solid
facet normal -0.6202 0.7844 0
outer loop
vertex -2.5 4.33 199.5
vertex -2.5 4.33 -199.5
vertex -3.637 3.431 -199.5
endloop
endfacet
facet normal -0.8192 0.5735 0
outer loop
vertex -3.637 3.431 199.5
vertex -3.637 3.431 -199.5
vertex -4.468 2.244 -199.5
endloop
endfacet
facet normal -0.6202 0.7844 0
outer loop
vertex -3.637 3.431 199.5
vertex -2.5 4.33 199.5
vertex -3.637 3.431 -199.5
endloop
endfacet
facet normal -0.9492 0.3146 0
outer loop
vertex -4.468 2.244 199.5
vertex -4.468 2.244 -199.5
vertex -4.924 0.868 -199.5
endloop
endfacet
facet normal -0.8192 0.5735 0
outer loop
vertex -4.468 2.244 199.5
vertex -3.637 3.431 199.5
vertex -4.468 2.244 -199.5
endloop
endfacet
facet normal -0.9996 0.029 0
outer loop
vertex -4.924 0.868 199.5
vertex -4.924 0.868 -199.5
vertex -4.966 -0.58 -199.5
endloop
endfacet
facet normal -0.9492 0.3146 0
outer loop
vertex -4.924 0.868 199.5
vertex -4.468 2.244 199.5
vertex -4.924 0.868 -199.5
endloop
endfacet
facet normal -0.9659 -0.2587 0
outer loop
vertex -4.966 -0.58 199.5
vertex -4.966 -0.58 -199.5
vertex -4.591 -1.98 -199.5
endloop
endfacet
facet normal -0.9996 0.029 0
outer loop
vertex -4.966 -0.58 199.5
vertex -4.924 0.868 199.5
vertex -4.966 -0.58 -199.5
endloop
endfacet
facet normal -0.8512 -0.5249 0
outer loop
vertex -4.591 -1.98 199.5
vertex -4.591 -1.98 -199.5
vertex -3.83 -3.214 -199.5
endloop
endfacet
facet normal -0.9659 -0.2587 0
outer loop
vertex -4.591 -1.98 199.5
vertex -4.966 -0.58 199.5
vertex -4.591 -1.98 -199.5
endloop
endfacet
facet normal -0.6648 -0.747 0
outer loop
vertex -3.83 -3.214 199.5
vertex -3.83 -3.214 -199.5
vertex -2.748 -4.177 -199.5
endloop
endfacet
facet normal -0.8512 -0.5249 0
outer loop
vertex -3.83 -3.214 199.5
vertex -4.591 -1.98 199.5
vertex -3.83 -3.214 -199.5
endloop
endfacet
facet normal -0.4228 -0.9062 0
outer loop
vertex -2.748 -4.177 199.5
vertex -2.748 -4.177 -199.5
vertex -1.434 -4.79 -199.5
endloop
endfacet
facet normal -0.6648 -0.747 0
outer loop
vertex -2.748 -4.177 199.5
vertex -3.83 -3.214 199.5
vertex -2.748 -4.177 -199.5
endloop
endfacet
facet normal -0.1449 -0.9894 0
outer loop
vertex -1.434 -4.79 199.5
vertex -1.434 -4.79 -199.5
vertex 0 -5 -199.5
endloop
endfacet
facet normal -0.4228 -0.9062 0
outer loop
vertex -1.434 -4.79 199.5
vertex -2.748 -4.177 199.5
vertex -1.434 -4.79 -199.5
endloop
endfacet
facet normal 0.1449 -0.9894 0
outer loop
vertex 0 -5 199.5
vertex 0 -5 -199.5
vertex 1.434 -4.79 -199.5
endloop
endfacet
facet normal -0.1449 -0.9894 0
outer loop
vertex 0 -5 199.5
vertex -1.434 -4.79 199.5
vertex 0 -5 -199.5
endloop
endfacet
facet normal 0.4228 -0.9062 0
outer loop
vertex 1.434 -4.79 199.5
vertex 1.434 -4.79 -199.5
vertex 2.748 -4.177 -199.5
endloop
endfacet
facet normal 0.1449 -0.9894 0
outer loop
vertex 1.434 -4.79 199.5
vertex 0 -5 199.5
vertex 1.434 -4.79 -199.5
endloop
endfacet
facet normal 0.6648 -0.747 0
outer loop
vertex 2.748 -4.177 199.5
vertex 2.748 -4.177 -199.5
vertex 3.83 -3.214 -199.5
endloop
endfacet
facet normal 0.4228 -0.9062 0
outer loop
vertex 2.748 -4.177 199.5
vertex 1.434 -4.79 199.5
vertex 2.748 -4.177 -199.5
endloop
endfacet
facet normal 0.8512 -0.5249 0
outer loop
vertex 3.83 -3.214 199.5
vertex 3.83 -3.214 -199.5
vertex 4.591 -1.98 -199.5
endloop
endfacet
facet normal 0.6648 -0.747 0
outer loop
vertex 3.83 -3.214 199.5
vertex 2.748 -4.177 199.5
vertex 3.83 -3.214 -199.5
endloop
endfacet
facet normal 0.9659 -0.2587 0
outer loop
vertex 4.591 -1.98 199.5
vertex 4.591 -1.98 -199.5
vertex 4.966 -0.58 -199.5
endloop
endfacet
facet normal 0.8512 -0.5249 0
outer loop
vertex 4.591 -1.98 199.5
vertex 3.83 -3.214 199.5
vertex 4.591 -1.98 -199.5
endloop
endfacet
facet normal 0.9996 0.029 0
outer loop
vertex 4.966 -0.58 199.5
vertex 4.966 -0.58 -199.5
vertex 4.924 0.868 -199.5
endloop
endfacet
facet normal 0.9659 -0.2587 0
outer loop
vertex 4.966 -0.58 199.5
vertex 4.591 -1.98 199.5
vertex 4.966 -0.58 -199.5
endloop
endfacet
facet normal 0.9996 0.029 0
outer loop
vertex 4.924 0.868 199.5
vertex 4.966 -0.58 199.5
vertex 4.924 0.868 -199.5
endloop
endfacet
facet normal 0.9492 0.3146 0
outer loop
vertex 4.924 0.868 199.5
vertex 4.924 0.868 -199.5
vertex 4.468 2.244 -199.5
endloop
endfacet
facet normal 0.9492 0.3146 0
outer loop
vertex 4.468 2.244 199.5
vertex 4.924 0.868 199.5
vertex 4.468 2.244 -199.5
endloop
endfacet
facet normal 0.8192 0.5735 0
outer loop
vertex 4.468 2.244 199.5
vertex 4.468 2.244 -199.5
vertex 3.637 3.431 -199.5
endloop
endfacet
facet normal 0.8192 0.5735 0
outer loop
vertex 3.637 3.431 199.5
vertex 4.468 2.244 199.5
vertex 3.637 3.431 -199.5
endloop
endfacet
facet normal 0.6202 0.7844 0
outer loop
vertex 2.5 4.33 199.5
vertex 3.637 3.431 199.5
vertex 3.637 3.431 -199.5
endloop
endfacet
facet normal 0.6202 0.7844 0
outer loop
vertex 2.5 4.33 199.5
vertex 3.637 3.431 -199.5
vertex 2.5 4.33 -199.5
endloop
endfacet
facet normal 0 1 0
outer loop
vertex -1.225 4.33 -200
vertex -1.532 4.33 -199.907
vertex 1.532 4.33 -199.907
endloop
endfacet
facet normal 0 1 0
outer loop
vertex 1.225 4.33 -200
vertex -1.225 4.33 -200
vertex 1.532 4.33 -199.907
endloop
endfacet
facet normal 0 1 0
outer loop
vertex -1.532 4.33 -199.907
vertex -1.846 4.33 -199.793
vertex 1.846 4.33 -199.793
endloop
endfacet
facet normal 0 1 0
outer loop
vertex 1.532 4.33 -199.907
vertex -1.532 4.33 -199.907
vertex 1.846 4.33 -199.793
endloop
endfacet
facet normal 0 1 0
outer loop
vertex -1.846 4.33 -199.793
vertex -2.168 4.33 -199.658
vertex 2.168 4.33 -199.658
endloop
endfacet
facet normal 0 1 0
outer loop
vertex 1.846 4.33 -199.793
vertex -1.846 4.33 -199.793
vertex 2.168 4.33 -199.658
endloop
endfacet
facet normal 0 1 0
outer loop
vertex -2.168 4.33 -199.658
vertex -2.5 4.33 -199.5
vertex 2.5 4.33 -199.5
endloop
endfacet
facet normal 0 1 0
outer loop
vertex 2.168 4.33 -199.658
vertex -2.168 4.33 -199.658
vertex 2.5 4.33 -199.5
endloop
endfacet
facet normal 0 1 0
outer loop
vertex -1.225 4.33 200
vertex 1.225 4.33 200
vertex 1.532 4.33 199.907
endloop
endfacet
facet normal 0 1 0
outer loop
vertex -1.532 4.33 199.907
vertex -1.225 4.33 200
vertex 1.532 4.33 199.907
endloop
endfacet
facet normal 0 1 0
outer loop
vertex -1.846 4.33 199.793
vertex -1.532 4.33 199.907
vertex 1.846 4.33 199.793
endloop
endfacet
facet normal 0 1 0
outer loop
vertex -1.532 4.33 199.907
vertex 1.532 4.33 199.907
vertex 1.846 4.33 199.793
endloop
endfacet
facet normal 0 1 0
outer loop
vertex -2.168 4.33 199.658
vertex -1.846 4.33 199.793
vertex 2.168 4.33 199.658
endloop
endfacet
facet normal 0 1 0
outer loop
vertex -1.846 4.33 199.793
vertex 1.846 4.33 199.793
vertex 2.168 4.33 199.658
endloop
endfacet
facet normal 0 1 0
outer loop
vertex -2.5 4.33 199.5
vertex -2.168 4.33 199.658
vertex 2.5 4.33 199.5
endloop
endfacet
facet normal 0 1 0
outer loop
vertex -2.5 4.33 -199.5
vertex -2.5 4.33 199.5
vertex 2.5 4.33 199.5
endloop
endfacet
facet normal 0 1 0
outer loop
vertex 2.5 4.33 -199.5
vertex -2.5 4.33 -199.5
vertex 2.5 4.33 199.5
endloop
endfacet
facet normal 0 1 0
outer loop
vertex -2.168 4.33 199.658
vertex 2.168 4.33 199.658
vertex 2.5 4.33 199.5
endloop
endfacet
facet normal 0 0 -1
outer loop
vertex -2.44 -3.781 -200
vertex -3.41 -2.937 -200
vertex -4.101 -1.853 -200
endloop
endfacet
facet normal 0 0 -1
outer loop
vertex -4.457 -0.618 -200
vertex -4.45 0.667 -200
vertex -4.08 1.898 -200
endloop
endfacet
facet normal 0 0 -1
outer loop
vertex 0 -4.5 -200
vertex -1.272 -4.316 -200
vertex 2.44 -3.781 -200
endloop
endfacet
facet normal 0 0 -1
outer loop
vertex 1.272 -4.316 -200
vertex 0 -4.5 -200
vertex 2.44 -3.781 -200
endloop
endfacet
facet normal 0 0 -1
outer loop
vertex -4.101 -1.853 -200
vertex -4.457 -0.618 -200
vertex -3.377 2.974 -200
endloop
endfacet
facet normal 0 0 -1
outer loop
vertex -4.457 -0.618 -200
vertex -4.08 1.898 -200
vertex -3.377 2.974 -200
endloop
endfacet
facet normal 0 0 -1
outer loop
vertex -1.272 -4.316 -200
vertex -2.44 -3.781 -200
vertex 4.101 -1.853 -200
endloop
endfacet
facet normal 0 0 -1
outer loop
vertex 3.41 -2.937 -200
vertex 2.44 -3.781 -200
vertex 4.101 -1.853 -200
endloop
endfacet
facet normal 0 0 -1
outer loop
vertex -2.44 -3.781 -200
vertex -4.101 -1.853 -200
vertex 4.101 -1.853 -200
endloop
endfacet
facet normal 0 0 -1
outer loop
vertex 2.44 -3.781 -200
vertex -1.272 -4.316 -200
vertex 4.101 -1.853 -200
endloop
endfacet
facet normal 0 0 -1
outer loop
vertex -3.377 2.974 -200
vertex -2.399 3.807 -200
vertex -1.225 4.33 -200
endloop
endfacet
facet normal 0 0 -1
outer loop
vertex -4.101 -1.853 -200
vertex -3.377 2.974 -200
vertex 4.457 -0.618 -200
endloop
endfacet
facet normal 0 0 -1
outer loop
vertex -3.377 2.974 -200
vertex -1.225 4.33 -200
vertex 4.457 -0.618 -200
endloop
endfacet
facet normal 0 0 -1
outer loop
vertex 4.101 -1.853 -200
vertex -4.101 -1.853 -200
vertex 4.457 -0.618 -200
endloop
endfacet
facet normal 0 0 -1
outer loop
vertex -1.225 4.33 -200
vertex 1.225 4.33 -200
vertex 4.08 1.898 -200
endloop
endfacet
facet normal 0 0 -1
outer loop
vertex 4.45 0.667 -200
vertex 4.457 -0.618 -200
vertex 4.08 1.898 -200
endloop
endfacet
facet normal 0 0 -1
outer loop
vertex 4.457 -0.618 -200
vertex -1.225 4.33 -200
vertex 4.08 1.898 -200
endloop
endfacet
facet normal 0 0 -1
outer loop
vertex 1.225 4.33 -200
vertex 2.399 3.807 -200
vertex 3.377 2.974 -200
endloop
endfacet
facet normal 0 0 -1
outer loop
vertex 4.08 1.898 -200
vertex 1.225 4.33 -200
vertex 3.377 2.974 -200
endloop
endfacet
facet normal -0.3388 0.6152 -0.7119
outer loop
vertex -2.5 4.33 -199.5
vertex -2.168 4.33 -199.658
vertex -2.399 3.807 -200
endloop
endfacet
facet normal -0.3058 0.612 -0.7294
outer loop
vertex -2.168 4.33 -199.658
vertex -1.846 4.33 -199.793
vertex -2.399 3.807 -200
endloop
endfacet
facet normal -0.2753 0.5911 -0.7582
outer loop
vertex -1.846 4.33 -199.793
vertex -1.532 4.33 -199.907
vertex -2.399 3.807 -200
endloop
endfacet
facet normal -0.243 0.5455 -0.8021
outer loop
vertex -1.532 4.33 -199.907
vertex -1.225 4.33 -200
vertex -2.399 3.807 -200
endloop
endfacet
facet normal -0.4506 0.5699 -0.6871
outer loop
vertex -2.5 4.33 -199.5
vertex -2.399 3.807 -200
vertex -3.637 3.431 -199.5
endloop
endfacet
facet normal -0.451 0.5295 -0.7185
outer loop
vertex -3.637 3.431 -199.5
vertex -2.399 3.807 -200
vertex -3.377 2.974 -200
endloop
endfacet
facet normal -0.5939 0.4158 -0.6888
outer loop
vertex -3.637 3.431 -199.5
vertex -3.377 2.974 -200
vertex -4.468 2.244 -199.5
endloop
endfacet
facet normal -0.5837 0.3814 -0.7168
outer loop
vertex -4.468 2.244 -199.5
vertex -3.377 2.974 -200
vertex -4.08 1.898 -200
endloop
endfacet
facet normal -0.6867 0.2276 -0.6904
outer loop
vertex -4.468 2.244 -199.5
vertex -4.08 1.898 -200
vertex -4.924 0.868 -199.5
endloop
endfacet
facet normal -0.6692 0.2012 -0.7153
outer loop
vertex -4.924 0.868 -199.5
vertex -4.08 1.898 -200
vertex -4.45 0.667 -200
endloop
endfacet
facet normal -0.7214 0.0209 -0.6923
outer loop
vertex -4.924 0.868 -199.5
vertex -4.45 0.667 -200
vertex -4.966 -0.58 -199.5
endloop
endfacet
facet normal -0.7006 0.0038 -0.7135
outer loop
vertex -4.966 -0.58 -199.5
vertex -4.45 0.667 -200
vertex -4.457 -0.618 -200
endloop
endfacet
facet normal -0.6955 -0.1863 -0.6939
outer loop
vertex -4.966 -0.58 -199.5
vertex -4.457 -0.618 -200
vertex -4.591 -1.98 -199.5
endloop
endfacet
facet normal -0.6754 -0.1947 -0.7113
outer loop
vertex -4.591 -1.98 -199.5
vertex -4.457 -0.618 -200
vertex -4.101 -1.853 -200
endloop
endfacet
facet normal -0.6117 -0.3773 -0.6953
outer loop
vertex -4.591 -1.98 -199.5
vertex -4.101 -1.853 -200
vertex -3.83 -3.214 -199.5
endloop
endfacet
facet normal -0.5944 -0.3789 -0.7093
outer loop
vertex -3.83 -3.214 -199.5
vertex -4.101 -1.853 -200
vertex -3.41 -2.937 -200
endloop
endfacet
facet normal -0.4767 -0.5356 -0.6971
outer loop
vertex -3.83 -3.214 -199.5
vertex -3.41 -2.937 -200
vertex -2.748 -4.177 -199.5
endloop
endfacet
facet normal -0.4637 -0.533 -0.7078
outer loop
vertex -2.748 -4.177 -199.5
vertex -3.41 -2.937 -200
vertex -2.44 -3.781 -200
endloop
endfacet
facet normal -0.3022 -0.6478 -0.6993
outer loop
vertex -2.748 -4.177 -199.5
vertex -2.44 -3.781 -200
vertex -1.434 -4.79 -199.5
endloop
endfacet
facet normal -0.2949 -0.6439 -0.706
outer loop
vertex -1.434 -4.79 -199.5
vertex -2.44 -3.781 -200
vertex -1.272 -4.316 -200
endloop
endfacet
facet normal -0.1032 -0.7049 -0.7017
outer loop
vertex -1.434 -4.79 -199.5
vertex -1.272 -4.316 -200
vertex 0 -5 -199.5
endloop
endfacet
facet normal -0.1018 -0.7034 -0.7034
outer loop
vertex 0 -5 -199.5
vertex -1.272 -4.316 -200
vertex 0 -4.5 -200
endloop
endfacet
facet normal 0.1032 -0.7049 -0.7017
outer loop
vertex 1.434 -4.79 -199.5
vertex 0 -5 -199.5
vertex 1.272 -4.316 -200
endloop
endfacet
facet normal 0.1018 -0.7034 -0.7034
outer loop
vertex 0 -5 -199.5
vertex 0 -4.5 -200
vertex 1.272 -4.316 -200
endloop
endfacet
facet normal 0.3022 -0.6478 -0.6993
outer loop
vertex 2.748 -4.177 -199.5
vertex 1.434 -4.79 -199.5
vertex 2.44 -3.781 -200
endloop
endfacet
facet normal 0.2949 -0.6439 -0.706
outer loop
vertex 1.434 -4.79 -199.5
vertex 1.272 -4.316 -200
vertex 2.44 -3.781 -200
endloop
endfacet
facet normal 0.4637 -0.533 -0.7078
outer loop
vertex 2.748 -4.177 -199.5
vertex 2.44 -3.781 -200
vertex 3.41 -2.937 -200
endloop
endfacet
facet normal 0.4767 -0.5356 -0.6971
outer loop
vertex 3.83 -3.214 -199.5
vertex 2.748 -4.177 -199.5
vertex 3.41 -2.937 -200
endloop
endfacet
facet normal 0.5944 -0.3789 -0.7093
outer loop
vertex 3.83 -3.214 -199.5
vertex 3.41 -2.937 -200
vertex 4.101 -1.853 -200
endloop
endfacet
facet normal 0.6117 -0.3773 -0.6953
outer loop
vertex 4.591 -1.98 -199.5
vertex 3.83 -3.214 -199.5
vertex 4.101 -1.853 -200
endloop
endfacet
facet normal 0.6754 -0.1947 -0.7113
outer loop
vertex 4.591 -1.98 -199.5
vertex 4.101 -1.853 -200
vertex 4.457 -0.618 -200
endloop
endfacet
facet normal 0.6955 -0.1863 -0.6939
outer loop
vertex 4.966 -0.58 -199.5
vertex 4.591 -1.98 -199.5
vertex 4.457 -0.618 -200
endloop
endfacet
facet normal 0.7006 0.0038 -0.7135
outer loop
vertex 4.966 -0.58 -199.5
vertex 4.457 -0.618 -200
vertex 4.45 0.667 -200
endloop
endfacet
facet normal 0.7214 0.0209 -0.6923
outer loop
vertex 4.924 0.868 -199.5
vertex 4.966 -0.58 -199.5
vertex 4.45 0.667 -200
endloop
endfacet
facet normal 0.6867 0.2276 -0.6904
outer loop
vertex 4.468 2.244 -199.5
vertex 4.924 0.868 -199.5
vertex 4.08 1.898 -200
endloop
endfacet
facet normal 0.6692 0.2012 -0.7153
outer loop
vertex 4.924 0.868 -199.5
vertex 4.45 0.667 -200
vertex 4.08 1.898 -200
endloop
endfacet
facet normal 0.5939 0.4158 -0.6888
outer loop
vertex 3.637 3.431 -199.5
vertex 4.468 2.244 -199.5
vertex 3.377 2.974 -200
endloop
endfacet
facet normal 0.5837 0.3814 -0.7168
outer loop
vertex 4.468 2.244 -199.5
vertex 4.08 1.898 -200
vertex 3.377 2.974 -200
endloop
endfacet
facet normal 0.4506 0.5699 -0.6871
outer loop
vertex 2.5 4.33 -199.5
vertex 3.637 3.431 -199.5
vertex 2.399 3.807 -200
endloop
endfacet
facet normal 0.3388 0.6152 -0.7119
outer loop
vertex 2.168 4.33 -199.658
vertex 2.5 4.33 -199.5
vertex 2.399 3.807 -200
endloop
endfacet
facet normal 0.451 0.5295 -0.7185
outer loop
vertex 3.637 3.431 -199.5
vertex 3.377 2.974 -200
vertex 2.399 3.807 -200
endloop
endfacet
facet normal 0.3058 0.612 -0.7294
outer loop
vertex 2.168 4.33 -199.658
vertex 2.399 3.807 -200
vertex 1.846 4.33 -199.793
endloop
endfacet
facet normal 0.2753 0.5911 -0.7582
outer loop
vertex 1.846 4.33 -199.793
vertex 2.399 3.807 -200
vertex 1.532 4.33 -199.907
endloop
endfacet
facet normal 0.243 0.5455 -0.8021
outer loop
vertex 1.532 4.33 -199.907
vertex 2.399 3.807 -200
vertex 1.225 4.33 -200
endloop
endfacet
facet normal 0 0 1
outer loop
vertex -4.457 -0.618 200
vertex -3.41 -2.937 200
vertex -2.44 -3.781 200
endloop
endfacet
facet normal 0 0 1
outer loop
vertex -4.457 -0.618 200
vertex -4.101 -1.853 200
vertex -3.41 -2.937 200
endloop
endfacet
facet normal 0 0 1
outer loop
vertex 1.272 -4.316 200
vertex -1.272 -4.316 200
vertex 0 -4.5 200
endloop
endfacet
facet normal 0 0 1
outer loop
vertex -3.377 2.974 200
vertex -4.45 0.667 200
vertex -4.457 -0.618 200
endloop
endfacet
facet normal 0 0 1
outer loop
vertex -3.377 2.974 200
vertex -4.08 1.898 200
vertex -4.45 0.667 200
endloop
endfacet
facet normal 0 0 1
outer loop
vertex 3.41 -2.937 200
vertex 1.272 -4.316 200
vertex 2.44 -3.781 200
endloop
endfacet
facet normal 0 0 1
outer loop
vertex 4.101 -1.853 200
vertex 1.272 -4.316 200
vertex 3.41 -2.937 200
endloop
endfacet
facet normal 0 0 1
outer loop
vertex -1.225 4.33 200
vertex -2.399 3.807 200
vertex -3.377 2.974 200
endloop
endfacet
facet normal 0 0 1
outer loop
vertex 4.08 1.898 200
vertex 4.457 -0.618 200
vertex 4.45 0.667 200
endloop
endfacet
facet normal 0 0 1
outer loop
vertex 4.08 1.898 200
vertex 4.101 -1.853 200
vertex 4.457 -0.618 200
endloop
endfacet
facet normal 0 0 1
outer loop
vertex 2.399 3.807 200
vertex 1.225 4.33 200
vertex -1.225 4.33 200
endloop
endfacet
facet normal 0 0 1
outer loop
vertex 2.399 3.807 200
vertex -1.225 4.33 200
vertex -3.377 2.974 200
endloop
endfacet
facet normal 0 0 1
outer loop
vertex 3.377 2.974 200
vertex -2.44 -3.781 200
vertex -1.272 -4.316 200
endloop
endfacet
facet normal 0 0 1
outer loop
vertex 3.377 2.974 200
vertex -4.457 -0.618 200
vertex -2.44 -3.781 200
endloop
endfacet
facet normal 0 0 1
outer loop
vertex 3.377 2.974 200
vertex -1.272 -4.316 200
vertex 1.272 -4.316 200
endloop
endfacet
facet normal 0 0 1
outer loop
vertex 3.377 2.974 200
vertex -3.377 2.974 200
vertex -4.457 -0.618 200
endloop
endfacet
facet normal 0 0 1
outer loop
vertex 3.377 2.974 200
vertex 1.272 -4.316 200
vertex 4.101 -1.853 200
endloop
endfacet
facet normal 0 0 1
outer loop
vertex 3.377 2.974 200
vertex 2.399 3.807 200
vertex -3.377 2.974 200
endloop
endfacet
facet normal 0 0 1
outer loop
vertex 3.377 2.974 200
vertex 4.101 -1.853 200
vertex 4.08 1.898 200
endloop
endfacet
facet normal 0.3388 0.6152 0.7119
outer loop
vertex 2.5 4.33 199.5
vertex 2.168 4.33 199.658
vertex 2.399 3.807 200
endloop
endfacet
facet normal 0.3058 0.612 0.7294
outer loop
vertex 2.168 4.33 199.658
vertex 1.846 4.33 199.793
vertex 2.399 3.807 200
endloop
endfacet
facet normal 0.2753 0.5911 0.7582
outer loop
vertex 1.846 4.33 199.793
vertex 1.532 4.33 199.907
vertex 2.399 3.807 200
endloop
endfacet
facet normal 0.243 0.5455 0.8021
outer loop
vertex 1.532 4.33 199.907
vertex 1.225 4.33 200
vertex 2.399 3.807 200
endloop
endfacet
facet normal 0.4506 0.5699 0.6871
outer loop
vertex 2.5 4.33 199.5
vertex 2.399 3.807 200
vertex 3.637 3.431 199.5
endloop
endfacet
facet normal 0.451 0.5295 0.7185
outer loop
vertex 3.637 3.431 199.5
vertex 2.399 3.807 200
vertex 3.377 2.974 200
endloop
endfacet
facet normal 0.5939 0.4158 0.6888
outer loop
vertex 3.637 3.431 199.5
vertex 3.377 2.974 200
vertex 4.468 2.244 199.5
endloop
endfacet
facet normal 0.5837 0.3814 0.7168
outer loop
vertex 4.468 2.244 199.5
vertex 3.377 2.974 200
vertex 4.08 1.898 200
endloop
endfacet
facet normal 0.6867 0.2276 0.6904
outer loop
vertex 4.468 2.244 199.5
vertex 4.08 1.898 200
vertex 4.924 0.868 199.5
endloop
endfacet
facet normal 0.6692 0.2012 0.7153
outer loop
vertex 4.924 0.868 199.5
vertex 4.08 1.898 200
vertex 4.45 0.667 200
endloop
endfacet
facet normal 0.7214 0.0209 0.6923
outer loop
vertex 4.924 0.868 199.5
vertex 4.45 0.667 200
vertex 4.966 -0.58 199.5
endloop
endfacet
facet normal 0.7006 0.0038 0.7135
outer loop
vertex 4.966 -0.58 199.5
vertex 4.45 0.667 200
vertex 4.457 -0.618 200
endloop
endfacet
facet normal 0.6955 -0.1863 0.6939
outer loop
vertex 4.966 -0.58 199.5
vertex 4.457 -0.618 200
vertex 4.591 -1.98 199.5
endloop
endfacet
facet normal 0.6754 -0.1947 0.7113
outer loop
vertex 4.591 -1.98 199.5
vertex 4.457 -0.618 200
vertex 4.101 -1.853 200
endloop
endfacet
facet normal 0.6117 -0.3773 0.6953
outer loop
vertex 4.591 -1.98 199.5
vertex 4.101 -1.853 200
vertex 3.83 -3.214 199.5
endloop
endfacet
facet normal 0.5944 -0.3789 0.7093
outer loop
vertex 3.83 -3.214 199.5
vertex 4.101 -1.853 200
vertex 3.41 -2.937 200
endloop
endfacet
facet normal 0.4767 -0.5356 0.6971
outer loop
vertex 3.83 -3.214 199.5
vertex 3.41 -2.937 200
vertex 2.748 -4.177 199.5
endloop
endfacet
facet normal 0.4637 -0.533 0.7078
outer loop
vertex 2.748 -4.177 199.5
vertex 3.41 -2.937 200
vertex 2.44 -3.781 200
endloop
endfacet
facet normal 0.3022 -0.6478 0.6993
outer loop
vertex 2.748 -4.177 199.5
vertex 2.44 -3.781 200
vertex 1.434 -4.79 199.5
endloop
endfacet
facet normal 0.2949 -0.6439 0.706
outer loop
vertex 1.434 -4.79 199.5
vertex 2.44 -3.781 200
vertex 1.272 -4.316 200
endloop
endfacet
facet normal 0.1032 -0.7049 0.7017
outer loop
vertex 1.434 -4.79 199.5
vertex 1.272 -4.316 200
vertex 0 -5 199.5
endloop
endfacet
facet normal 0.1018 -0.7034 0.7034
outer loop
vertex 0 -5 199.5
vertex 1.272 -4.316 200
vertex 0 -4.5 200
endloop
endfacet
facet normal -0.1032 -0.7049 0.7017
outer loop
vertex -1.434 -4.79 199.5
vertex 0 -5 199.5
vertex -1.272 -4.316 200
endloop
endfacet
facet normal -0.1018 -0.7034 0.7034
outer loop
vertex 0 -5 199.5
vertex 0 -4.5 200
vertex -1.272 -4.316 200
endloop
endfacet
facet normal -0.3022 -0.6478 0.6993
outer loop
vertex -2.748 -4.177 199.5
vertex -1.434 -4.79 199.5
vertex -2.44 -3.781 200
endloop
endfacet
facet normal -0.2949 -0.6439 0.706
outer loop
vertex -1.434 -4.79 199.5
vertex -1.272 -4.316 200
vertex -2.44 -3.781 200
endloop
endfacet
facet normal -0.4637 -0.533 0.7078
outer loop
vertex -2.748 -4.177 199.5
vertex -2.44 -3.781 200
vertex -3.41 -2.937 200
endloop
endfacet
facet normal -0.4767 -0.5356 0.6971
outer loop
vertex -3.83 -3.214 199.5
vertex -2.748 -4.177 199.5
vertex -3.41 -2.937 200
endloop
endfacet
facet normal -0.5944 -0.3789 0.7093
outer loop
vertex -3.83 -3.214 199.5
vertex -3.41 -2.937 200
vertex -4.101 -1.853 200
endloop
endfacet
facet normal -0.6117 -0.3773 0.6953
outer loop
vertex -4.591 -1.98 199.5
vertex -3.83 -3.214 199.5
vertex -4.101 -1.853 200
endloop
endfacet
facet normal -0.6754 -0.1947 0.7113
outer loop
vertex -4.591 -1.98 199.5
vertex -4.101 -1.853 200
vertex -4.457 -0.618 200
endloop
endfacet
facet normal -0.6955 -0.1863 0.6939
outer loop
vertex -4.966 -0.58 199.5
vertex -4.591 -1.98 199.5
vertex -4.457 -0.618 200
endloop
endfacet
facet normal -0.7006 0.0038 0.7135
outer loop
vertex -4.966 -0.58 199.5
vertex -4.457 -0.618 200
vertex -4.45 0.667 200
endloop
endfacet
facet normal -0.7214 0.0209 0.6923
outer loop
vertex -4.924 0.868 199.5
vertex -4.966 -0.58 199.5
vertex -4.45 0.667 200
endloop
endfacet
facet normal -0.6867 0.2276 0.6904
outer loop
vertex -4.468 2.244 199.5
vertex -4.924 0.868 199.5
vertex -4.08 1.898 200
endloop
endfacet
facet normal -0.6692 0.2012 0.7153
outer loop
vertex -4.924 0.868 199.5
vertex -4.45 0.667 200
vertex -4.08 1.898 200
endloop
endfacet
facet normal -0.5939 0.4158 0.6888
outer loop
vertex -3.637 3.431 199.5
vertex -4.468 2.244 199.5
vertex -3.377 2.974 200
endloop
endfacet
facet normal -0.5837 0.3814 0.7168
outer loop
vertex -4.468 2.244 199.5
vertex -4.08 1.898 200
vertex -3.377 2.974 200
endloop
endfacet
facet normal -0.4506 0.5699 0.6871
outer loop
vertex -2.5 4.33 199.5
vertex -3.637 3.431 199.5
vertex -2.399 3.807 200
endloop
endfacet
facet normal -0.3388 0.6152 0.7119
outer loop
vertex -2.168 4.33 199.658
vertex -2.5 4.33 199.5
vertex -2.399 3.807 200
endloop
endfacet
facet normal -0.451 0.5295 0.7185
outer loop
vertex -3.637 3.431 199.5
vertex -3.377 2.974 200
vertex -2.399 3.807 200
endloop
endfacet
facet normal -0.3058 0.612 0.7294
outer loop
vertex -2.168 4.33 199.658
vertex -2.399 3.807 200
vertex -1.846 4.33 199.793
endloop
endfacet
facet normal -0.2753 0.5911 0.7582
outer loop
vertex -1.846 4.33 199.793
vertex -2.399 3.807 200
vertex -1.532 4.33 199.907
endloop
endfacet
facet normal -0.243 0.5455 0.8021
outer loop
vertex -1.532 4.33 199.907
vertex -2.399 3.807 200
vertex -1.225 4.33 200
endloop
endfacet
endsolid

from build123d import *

# Parameters (mm, degrees)
SKETCH3_R                = 5
BOSS_EXTRUDE2_DEPTH      = 200
BOSS_EXTRUDE2_DEPTH_BACK = 200
CUT_EXTRUDE5_DEPTH       = 201
CUT_EXTRUDE5_DEPTH_BACK  = 201
CHAMFER1_SIZE            = 0.5


with BuildPart() as part:
    # Sketch3 → Boss-Extrude2 (new body, two sides)
    with BuildSketch(Plane.XY) as boss_extrude2_sk:
        Circle(SKETCH3_R)
    extrude(amount=BOSS_EXTRUDE2_DEPTH)
    extrude(boss_extrude2_sk.sketch, amount=-BOSS_EXTRUDE2_DEPTH_BACK)

    # Sketch10 → Cut-Extrude5 (cut, two sides)
    with BuildSketch(Plane.XY) as cut_extrude5_sk:
        with BuildLine():
            Line((-2.5, 4.330127019), (2.5, 4.330127019))
            ThreePointArc((2.5, 4.330127019), (0, 5), (-2.5, 4.330127019))
        make_face()
    extrude(amount=CUT_EXTRUDE5_DEPTH, mode=Mode.SUBTRACT)
    extrude(cut_extrude5_sk.sketch, amount=-CUT_EXTRUDE5_DEPTH_BACK, mode=Mode.SUBTRACT)

    # Chamfer1
    chamfer1_edges = [part.edges().sort_by_distance(p)[0] for p in [
        (0, -5, -200),
        (0, -5, 200),
    ]]
    chamfer(chamfer1_edges, length=CHAMFER1_SIZE)


solid = part.part
